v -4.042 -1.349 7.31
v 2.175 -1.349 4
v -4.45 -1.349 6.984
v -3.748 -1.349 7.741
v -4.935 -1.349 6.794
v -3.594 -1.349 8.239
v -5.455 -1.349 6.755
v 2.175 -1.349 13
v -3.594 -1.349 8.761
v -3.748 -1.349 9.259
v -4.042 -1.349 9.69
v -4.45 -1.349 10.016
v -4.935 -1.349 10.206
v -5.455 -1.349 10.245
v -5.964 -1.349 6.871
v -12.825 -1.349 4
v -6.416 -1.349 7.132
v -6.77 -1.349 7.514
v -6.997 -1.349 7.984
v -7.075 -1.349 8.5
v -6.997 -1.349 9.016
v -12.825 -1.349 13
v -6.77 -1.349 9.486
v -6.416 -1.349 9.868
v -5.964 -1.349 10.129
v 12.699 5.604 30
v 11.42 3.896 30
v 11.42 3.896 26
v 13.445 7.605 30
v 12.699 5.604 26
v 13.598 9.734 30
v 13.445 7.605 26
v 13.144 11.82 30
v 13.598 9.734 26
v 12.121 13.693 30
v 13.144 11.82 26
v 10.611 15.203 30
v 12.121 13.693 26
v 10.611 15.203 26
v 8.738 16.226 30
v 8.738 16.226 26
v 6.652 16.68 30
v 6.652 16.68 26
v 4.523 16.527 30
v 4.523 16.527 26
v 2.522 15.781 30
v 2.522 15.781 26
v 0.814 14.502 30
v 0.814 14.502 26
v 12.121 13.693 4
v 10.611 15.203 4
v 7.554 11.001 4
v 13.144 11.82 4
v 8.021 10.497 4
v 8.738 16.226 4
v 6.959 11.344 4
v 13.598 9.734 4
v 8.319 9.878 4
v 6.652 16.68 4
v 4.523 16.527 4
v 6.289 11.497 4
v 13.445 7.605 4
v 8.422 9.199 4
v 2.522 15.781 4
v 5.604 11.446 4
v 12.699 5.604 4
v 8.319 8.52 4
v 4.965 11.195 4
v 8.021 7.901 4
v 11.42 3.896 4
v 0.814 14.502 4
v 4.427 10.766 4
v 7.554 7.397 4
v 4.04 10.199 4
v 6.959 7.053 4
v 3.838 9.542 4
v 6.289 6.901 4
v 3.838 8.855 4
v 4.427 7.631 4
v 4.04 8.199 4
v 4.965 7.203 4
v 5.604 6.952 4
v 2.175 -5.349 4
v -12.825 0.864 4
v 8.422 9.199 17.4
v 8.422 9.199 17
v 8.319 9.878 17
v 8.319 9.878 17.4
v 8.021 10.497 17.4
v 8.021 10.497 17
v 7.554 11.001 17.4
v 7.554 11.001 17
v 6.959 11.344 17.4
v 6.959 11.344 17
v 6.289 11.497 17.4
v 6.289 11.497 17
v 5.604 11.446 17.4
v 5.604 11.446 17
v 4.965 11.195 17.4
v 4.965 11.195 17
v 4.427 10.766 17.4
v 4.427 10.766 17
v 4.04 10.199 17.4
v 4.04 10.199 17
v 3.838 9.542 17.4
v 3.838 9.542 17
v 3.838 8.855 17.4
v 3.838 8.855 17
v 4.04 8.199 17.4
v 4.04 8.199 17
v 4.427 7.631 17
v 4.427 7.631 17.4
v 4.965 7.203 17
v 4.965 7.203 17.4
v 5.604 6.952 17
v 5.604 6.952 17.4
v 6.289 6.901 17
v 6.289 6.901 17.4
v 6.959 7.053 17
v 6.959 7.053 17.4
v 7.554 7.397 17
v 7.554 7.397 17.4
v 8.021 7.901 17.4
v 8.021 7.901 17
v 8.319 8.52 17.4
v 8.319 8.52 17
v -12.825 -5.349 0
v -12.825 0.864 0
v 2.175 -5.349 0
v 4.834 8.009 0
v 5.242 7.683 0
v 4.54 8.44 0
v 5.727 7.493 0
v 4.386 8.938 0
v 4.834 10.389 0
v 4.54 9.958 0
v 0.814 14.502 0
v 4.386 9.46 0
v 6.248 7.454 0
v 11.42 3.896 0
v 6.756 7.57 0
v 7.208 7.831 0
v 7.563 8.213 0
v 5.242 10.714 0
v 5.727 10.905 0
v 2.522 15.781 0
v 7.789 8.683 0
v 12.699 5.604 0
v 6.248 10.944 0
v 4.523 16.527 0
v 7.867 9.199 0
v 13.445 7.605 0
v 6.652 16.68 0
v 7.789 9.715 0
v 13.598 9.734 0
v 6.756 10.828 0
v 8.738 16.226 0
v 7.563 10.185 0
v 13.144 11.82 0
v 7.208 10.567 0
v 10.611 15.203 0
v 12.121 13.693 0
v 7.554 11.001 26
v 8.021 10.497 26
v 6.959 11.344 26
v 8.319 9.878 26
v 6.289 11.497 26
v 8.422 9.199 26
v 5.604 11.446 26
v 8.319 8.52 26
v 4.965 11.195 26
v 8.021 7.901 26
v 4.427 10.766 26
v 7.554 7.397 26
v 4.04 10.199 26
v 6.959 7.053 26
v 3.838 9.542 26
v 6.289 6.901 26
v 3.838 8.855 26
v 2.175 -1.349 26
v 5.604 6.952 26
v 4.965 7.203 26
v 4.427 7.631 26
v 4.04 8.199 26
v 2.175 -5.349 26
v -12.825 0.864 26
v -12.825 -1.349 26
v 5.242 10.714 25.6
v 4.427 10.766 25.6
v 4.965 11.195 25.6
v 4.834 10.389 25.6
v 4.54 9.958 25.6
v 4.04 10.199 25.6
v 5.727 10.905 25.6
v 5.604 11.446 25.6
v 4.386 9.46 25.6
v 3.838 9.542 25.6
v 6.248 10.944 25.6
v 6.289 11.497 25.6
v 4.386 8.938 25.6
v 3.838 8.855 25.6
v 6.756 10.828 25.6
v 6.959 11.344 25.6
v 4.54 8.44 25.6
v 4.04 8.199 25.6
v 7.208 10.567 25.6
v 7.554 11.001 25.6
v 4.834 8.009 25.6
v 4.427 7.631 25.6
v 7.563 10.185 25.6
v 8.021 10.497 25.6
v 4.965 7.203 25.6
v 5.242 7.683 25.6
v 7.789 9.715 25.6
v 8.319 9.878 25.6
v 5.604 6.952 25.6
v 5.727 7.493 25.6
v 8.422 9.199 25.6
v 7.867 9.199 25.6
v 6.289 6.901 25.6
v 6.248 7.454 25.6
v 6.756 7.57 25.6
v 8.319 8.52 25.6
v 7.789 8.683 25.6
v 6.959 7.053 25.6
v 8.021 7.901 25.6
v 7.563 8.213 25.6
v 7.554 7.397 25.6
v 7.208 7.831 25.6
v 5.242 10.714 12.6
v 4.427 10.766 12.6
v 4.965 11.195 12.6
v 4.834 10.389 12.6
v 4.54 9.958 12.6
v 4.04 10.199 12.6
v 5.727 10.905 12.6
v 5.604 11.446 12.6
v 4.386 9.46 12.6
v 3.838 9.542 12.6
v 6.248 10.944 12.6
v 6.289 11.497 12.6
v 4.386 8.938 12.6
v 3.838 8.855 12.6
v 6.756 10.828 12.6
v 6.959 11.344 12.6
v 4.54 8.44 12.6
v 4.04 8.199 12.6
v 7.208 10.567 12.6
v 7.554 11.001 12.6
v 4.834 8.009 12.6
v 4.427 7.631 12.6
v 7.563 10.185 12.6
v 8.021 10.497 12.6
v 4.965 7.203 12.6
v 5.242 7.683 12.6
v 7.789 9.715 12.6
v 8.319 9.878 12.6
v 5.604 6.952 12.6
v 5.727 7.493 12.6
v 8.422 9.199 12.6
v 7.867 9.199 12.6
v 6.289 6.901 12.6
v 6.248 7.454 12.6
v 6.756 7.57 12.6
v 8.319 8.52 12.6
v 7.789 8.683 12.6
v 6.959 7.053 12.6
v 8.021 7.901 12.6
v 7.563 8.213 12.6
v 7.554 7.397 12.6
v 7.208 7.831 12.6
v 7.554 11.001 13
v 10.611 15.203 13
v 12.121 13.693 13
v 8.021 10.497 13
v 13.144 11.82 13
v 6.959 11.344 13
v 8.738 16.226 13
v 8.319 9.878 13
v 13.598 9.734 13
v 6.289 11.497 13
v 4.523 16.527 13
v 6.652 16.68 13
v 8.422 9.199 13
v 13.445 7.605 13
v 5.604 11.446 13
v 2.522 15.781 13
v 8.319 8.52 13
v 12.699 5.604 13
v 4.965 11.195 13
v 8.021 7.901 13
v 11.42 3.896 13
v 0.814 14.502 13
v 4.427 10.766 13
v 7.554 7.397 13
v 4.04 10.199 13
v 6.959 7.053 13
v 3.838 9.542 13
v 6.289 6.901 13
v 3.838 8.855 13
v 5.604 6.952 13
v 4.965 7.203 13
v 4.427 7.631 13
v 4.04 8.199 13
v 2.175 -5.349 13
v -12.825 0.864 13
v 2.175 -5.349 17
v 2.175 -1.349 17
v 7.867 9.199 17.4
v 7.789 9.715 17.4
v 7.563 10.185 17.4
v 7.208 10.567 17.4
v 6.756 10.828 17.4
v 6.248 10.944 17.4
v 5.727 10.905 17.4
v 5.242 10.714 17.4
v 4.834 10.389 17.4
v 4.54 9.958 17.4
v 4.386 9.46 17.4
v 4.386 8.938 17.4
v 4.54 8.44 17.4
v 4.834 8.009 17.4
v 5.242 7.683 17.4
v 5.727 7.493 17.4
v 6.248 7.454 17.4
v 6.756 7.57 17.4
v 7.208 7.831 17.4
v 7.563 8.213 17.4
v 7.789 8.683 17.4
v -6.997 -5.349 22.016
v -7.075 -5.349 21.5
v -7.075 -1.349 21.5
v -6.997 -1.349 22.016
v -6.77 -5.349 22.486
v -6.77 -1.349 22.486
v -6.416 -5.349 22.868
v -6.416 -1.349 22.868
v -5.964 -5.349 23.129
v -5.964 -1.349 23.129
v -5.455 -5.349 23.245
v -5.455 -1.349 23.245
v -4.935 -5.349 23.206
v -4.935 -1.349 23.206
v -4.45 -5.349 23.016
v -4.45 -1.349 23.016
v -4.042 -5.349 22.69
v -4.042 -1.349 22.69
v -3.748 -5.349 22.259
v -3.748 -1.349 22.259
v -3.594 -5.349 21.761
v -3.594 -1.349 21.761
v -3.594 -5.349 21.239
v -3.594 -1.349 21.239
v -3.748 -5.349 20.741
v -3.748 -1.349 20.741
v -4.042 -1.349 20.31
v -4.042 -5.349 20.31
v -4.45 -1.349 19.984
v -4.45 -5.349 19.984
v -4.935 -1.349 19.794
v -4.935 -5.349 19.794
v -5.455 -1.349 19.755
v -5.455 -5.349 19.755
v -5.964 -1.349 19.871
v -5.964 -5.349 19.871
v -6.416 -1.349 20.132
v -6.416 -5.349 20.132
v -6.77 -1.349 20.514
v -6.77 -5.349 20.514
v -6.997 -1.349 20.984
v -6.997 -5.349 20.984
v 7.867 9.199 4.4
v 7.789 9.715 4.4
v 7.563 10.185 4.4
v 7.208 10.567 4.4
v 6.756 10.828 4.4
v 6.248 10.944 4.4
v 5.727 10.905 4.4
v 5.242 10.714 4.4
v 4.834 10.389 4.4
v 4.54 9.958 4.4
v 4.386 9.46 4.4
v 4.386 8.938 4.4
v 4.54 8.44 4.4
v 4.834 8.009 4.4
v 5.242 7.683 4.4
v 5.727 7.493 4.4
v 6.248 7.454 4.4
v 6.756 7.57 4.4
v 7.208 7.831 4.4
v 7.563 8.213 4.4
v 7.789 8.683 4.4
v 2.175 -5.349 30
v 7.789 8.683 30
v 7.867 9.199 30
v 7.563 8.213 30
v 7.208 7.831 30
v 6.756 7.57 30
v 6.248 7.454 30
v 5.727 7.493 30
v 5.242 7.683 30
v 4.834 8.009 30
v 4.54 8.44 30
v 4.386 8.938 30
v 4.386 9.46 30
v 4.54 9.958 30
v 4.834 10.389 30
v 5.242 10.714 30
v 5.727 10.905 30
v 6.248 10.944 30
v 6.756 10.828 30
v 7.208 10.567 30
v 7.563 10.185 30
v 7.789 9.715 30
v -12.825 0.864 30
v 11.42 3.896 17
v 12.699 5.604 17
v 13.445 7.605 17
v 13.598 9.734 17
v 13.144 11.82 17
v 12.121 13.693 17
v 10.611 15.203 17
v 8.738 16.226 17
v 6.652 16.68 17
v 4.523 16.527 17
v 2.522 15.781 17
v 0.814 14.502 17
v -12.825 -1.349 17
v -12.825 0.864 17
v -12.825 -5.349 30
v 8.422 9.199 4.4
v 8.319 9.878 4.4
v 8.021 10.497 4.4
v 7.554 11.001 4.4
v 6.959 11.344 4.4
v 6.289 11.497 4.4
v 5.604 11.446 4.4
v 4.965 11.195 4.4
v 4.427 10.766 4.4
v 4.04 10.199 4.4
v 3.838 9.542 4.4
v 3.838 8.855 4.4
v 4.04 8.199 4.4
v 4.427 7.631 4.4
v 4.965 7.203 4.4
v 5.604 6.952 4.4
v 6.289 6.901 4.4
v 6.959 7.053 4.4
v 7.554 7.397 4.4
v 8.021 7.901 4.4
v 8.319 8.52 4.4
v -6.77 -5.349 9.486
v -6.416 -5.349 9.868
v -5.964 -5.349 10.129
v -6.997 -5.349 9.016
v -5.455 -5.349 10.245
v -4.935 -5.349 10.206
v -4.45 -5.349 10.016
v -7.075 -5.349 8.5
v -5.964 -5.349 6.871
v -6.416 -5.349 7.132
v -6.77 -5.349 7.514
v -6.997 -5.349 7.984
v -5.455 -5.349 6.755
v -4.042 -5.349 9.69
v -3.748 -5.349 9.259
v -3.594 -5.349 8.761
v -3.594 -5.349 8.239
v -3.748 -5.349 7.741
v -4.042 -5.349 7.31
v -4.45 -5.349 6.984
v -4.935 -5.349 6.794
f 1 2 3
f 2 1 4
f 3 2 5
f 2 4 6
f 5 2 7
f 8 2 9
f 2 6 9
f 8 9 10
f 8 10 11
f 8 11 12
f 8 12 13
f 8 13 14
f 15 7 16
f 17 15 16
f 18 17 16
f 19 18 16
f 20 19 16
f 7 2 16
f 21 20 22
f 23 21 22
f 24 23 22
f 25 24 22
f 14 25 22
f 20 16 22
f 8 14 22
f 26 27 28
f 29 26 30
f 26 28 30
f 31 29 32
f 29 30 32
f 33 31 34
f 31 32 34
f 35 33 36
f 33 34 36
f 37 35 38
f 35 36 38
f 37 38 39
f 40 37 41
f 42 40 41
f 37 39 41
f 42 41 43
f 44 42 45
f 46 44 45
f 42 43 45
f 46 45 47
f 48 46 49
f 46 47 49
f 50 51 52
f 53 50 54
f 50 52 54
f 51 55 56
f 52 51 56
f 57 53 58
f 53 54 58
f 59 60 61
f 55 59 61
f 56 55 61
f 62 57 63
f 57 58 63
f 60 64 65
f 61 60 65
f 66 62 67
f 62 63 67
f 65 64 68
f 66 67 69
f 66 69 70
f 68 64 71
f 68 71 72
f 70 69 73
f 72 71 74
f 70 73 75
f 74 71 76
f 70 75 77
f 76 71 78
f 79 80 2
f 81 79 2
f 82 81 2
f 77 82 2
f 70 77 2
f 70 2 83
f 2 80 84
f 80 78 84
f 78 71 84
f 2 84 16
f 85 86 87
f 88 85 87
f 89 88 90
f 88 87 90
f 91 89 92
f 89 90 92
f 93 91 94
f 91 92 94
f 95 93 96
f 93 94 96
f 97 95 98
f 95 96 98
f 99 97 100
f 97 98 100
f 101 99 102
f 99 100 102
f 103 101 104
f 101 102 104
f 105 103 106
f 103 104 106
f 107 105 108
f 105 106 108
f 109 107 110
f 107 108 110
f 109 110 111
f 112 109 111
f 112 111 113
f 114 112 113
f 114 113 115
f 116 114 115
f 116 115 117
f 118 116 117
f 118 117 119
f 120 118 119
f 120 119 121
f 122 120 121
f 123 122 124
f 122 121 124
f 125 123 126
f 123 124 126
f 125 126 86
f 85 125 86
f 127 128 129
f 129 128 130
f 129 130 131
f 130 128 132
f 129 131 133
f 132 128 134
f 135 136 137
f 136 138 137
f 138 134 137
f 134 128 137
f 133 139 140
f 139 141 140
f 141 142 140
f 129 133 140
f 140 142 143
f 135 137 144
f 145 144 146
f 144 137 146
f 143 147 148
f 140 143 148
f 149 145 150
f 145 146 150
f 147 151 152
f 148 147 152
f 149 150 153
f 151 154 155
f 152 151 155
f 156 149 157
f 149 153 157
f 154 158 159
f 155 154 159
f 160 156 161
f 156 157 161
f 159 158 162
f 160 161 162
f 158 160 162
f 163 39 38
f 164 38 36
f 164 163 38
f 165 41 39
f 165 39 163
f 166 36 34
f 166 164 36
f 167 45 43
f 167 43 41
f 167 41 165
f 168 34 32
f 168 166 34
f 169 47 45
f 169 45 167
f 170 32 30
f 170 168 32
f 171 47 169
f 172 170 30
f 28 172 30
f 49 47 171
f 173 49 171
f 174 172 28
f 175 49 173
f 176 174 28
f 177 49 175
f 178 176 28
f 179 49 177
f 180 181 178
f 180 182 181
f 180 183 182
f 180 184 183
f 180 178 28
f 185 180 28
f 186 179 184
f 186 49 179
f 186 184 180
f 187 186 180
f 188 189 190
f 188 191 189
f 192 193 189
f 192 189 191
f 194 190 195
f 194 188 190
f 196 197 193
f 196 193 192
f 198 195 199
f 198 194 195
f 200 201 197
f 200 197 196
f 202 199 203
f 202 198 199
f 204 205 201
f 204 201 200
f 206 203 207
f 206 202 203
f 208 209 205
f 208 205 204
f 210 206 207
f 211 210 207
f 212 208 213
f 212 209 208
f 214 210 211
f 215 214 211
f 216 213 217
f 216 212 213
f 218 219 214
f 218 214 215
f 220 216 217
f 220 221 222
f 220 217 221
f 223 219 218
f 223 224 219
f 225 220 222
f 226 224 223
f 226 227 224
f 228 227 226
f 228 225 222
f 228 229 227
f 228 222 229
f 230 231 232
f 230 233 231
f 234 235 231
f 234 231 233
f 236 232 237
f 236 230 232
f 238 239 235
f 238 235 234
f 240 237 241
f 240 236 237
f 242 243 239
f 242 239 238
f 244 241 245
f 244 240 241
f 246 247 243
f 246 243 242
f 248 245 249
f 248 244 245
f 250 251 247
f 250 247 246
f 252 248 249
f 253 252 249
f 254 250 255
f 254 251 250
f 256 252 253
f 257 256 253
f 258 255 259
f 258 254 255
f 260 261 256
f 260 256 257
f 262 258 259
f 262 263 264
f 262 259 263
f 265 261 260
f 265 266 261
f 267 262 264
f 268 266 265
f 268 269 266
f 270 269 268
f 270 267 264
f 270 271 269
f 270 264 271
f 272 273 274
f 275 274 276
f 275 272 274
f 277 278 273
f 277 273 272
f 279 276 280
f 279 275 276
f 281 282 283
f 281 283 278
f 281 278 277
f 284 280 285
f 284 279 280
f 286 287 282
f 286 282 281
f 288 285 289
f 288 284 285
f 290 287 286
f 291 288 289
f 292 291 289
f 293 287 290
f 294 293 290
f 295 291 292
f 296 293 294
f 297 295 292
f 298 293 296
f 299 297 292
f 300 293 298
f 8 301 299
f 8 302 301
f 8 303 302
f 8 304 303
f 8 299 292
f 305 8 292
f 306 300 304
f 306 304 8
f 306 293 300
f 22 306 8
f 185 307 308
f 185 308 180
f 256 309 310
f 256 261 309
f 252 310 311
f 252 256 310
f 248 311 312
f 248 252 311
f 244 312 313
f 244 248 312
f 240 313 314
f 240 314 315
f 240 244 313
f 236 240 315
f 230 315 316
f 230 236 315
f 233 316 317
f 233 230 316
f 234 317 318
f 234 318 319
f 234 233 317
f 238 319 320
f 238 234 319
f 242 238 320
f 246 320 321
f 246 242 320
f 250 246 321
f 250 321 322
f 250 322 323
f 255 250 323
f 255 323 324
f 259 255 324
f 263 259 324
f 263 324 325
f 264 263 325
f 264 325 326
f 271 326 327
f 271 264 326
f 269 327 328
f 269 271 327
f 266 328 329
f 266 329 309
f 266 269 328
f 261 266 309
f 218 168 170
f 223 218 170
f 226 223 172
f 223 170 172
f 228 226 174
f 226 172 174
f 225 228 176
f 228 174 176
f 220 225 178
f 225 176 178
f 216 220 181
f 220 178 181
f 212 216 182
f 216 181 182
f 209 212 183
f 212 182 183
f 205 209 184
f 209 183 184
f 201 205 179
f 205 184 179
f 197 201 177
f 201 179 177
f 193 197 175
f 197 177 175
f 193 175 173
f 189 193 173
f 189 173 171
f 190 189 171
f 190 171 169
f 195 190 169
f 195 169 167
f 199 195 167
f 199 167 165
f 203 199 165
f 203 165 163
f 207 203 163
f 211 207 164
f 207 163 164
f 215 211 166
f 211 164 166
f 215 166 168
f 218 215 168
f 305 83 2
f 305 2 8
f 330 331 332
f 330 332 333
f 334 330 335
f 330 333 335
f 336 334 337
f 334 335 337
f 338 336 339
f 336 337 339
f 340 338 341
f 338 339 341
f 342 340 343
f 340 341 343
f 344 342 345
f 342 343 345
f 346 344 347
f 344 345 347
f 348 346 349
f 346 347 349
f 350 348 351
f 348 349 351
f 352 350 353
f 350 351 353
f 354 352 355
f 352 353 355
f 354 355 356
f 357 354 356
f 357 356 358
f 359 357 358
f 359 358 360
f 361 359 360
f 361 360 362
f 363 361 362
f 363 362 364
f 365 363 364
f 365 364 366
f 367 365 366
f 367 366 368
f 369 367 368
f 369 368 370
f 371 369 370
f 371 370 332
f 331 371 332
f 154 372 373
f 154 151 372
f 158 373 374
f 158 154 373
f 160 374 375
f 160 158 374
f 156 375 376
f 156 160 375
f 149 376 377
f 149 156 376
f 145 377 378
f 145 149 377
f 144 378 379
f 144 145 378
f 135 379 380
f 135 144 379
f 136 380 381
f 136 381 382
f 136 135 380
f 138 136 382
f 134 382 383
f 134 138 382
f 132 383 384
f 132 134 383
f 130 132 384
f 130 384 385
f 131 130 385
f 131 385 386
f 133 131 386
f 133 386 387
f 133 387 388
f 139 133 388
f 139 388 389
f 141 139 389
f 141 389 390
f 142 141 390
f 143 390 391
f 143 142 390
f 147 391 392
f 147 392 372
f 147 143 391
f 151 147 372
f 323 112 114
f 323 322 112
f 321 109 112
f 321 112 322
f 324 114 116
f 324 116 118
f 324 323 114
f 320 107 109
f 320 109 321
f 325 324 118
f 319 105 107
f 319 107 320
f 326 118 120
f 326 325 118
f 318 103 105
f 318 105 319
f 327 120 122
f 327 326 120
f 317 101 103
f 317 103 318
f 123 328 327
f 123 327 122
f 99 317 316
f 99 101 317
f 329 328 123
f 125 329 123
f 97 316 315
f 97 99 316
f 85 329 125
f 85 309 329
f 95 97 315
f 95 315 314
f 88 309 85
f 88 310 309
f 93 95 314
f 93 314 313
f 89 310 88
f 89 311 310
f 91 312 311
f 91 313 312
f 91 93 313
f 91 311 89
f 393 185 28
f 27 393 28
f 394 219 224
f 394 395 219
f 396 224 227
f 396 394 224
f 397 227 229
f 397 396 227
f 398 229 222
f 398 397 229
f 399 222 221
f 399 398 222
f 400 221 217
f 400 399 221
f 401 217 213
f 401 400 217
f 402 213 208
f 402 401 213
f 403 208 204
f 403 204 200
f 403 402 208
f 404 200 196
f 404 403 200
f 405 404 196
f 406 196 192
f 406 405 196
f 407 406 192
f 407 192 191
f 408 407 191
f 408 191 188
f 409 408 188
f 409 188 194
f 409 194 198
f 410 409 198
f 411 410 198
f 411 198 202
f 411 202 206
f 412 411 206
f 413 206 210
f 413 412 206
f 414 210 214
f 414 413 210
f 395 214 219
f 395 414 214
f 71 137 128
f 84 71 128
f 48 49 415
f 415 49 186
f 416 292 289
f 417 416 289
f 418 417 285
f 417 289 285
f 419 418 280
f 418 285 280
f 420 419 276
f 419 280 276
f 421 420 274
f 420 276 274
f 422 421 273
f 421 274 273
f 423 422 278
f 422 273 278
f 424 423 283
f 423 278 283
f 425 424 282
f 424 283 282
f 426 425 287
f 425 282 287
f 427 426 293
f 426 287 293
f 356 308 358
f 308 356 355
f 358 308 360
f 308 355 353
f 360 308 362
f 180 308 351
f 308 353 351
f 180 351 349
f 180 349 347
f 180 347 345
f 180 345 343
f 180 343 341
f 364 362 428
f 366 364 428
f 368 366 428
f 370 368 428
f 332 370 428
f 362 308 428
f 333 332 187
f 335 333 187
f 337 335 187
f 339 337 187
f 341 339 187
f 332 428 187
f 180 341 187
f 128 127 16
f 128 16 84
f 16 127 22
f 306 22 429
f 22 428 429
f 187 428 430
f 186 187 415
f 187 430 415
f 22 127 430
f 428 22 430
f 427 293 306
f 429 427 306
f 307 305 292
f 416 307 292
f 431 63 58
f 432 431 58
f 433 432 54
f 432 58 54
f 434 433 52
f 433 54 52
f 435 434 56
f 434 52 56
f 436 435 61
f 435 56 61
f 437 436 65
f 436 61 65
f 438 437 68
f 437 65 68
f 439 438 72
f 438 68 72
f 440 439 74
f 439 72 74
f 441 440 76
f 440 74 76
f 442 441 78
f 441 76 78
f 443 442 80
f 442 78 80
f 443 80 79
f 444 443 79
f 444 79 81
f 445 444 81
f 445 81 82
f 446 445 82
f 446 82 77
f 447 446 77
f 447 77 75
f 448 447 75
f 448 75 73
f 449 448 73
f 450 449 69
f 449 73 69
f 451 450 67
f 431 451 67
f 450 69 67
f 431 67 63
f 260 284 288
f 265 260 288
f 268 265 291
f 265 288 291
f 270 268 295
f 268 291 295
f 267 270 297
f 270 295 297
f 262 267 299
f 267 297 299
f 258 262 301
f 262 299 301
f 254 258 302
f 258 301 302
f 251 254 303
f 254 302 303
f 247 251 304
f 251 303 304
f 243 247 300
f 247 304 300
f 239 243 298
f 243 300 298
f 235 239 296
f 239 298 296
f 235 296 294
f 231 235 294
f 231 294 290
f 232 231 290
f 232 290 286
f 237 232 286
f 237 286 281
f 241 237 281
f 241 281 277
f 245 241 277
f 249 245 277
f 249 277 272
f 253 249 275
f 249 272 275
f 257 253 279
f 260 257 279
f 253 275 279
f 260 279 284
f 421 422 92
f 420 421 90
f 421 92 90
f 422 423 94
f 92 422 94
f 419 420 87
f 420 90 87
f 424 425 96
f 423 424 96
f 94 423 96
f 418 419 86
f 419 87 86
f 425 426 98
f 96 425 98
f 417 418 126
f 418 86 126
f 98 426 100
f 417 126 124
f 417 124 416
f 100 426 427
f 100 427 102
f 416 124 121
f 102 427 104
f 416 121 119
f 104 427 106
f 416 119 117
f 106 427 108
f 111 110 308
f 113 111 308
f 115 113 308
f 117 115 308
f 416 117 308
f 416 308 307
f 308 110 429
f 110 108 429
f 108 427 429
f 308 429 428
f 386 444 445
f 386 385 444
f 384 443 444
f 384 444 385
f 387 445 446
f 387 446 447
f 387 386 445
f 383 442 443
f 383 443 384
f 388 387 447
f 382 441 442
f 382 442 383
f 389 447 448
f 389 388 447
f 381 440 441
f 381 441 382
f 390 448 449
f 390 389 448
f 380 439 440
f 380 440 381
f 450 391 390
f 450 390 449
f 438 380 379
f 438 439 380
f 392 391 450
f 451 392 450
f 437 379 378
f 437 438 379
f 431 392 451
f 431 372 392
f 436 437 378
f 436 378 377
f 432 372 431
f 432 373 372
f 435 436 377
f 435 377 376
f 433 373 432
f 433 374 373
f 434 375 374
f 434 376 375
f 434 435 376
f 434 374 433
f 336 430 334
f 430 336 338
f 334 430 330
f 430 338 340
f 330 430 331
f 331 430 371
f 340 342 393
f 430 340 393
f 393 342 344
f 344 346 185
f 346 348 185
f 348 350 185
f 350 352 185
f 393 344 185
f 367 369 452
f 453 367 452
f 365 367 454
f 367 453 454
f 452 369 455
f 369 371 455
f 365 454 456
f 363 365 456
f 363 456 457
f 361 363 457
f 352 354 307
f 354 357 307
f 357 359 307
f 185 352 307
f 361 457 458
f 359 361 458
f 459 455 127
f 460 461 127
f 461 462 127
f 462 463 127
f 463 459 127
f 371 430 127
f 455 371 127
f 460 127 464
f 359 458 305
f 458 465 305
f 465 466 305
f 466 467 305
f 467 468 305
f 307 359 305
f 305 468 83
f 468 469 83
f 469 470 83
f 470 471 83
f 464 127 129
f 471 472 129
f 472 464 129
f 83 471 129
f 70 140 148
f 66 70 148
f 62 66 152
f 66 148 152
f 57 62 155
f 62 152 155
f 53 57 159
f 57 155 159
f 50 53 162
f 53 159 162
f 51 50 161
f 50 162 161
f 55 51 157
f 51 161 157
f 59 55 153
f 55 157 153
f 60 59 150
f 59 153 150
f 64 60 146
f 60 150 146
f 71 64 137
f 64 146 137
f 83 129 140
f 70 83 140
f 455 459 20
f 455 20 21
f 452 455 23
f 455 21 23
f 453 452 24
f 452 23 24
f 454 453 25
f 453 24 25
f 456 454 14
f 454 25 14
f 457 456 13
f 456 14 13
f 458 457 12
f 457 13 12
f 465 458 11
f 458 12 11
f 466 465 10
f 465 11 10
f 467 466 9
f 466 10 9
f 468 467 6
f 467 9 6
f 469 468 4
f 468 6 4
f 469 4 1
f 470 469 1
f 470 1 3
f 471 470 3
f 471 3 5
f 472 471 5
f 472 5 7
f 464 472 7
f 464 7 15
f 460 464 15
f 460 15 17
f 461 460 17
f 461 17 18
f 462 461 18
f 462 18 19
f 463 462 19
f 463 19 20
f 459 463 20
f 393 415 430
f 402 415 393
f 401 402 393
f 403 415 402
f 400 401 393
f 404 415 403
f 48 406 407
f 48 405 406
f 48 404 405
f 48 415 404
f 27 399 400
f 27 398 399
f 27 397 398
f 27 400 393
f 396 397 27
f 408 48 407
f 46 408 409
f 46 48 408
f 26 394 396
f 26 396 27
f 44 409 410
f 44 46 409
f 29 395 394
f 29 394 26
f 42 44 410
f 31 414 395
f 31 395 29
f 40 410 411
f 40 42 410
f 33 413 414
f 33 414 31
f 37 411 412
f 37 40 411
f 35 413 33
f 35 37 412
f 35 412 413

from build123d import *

# Parameters (mm, degrees)
F0_R      = 1.75
F1_DEPTH  = 30
F2_W      = 23.070765
F2_H      = 9
F2_W_2    = 27.746933
F3_DEPTH  = 39.1
F4_W      = 2.213204
F4_H      = 16.336968
F5_DEPTH  = 500
F6_R      = 2.30465
F6_R_2    = 1.75
F7_DEPTH  = 0.4
F8_R      = 2.30465
F8_R_2    = 1.75
F9_DEPTH  = 0.4
F10_R     = 2.30465
F10_R_2   = 1.75
F11_DEPTH = 0.4
F12_R     = 2.30465
F12_R_2   = 1.75
F13_DEPTH = 0.4
F14_W     = 4
F14_H     = 9
F15_DEPTH = 6
F16_R     = 1.75
F17_DEPTH = 25


with BuildPart() as f1:
    # F0 (on Top) → F1 (new body)
    with BuildSketch(Plane.XY):
        with BuildLine():
            Line((-15.037711, -5.349152), (2.175493, -5.349152))
            Line((2.175493, -5.349152), (11.420161, 3.895517))
            ThreePointArc((11.420161, 3.895517), (11.420161, 14.502118), (0.813559, 14.502118))
            Line((0.813559, 14.502118), (-15.037711, -1.349152))
            Line((-15.037711, -1.349152), (-15.037711, -5.349152))
        make_face()
        with Locations((6.11686, 9.198817)):
            Circle(F0_R, mode=Mode.SUBTRACT)
    extrude(amount=F1_DEPTH)

    # F2 (on face) → F3 (cut)
    with BuildSketch(Plane(origin=(-15.037711, 0, 0), x_dir=(0, -1, 0), z_dir=(-1, 0, 0))):
        with Locations((-10.18623, 8.5)):
            Rectangle(F2_W, F2_H)
        with Locations((-12.524314, 21.5)):
            Rectangle(F2_W_2, F2_H)
    extrude(amount=-F3_DEPTH, mode=Mode.SUBTRACT)

    # F4 (on face) → F5 (cut)
    with BuildSketch(Plane.XY.offset(30)):
        with Locations((-13.931109, 2.819332)):
            Rectangle(F4_W, F4_H)
    extrude(amount=-F5_DEPTH, mode=Mode.SUBTRACT)

    # F6 (on face) → F7 (join)
    with BuildSketch(Plane(origin=(0, 0, 13), x_dir=(1, 0, 0), z_dir=(0, 0, -1))):
        with Locations((6.11686, -9.198817)):
            Circle(F6_R)
        with Locations((6.11686, -9.198817)):
            Circle(F6_R_2, mode=Mode.SUBTRACT)
    extrude(amount=F7_DEPTH)

    # F8 (on face) → F9 (join)
    with BuildSketch(Plane(origin=(0, 0, 26), x_dir=(1, 0, 0), z_dir=(0, 0, -1))):
        with Locations((6.11686, -9.198817)):
            Circle(F8_R)
        with Locations((6.11686, -9.198817)):
            Circle(F8_R_2, mode=Mode.SUBTRACT)
    extrude(amount=F9_DEPTH)

    # F10 (on face) → F11 (join)
    with BuildSketch(Plane.XY.offset(17)):
        with Locations((6.11686, 9.198817)):
            Circle(F10_R)
        with Locations((6.11686, 9.198817)):
            Circle(F10_R_2, mode=Mode.SUBTRACT)
    extrude(amount=F11_DEPTH)

    # F12 (on face) → F13 (join)
    with BuildSketch(Plane.XY.offset(4)):
        with Locations((6.11686, 9.198817)):
            Circle(F12_R)
        with Locations((6.11686, 9.198817)):
            Circle(F12_R_2, mode=Mode.SUBTRACT)
    extrude(amount=F13_DEPTH)

    # F14 (on face) → F15 (cut)
    with BuildSketch(Plane.XZ.offset(5.349152)):
        with Locations((4.175493, 8.5)):
            Rectangle(F14_W, F14_H)
        with Locations((4.175493, 21.5)):
            Rectangle(F14_W, F14_H)
    extrude(amount=-F15_DEPTH, mode=Mode.SUBTRACT)

    # F16 (on face) → F17 (cut)
    with BuildSketch(Plane(origin=(0, -1.349152, 0), x_dir=(-1, 0, 0), z_dir=(0, 1, 0))):
        with Locations((5.324507, 21.5)):
            Circle(F16_R)
        with Locations((5.324507, 8.5)):
            Circle(F16_R)
    extrude(amount=-F17_DEPTH, mode=Mode.SUBTRACT)


solid = f1.part
